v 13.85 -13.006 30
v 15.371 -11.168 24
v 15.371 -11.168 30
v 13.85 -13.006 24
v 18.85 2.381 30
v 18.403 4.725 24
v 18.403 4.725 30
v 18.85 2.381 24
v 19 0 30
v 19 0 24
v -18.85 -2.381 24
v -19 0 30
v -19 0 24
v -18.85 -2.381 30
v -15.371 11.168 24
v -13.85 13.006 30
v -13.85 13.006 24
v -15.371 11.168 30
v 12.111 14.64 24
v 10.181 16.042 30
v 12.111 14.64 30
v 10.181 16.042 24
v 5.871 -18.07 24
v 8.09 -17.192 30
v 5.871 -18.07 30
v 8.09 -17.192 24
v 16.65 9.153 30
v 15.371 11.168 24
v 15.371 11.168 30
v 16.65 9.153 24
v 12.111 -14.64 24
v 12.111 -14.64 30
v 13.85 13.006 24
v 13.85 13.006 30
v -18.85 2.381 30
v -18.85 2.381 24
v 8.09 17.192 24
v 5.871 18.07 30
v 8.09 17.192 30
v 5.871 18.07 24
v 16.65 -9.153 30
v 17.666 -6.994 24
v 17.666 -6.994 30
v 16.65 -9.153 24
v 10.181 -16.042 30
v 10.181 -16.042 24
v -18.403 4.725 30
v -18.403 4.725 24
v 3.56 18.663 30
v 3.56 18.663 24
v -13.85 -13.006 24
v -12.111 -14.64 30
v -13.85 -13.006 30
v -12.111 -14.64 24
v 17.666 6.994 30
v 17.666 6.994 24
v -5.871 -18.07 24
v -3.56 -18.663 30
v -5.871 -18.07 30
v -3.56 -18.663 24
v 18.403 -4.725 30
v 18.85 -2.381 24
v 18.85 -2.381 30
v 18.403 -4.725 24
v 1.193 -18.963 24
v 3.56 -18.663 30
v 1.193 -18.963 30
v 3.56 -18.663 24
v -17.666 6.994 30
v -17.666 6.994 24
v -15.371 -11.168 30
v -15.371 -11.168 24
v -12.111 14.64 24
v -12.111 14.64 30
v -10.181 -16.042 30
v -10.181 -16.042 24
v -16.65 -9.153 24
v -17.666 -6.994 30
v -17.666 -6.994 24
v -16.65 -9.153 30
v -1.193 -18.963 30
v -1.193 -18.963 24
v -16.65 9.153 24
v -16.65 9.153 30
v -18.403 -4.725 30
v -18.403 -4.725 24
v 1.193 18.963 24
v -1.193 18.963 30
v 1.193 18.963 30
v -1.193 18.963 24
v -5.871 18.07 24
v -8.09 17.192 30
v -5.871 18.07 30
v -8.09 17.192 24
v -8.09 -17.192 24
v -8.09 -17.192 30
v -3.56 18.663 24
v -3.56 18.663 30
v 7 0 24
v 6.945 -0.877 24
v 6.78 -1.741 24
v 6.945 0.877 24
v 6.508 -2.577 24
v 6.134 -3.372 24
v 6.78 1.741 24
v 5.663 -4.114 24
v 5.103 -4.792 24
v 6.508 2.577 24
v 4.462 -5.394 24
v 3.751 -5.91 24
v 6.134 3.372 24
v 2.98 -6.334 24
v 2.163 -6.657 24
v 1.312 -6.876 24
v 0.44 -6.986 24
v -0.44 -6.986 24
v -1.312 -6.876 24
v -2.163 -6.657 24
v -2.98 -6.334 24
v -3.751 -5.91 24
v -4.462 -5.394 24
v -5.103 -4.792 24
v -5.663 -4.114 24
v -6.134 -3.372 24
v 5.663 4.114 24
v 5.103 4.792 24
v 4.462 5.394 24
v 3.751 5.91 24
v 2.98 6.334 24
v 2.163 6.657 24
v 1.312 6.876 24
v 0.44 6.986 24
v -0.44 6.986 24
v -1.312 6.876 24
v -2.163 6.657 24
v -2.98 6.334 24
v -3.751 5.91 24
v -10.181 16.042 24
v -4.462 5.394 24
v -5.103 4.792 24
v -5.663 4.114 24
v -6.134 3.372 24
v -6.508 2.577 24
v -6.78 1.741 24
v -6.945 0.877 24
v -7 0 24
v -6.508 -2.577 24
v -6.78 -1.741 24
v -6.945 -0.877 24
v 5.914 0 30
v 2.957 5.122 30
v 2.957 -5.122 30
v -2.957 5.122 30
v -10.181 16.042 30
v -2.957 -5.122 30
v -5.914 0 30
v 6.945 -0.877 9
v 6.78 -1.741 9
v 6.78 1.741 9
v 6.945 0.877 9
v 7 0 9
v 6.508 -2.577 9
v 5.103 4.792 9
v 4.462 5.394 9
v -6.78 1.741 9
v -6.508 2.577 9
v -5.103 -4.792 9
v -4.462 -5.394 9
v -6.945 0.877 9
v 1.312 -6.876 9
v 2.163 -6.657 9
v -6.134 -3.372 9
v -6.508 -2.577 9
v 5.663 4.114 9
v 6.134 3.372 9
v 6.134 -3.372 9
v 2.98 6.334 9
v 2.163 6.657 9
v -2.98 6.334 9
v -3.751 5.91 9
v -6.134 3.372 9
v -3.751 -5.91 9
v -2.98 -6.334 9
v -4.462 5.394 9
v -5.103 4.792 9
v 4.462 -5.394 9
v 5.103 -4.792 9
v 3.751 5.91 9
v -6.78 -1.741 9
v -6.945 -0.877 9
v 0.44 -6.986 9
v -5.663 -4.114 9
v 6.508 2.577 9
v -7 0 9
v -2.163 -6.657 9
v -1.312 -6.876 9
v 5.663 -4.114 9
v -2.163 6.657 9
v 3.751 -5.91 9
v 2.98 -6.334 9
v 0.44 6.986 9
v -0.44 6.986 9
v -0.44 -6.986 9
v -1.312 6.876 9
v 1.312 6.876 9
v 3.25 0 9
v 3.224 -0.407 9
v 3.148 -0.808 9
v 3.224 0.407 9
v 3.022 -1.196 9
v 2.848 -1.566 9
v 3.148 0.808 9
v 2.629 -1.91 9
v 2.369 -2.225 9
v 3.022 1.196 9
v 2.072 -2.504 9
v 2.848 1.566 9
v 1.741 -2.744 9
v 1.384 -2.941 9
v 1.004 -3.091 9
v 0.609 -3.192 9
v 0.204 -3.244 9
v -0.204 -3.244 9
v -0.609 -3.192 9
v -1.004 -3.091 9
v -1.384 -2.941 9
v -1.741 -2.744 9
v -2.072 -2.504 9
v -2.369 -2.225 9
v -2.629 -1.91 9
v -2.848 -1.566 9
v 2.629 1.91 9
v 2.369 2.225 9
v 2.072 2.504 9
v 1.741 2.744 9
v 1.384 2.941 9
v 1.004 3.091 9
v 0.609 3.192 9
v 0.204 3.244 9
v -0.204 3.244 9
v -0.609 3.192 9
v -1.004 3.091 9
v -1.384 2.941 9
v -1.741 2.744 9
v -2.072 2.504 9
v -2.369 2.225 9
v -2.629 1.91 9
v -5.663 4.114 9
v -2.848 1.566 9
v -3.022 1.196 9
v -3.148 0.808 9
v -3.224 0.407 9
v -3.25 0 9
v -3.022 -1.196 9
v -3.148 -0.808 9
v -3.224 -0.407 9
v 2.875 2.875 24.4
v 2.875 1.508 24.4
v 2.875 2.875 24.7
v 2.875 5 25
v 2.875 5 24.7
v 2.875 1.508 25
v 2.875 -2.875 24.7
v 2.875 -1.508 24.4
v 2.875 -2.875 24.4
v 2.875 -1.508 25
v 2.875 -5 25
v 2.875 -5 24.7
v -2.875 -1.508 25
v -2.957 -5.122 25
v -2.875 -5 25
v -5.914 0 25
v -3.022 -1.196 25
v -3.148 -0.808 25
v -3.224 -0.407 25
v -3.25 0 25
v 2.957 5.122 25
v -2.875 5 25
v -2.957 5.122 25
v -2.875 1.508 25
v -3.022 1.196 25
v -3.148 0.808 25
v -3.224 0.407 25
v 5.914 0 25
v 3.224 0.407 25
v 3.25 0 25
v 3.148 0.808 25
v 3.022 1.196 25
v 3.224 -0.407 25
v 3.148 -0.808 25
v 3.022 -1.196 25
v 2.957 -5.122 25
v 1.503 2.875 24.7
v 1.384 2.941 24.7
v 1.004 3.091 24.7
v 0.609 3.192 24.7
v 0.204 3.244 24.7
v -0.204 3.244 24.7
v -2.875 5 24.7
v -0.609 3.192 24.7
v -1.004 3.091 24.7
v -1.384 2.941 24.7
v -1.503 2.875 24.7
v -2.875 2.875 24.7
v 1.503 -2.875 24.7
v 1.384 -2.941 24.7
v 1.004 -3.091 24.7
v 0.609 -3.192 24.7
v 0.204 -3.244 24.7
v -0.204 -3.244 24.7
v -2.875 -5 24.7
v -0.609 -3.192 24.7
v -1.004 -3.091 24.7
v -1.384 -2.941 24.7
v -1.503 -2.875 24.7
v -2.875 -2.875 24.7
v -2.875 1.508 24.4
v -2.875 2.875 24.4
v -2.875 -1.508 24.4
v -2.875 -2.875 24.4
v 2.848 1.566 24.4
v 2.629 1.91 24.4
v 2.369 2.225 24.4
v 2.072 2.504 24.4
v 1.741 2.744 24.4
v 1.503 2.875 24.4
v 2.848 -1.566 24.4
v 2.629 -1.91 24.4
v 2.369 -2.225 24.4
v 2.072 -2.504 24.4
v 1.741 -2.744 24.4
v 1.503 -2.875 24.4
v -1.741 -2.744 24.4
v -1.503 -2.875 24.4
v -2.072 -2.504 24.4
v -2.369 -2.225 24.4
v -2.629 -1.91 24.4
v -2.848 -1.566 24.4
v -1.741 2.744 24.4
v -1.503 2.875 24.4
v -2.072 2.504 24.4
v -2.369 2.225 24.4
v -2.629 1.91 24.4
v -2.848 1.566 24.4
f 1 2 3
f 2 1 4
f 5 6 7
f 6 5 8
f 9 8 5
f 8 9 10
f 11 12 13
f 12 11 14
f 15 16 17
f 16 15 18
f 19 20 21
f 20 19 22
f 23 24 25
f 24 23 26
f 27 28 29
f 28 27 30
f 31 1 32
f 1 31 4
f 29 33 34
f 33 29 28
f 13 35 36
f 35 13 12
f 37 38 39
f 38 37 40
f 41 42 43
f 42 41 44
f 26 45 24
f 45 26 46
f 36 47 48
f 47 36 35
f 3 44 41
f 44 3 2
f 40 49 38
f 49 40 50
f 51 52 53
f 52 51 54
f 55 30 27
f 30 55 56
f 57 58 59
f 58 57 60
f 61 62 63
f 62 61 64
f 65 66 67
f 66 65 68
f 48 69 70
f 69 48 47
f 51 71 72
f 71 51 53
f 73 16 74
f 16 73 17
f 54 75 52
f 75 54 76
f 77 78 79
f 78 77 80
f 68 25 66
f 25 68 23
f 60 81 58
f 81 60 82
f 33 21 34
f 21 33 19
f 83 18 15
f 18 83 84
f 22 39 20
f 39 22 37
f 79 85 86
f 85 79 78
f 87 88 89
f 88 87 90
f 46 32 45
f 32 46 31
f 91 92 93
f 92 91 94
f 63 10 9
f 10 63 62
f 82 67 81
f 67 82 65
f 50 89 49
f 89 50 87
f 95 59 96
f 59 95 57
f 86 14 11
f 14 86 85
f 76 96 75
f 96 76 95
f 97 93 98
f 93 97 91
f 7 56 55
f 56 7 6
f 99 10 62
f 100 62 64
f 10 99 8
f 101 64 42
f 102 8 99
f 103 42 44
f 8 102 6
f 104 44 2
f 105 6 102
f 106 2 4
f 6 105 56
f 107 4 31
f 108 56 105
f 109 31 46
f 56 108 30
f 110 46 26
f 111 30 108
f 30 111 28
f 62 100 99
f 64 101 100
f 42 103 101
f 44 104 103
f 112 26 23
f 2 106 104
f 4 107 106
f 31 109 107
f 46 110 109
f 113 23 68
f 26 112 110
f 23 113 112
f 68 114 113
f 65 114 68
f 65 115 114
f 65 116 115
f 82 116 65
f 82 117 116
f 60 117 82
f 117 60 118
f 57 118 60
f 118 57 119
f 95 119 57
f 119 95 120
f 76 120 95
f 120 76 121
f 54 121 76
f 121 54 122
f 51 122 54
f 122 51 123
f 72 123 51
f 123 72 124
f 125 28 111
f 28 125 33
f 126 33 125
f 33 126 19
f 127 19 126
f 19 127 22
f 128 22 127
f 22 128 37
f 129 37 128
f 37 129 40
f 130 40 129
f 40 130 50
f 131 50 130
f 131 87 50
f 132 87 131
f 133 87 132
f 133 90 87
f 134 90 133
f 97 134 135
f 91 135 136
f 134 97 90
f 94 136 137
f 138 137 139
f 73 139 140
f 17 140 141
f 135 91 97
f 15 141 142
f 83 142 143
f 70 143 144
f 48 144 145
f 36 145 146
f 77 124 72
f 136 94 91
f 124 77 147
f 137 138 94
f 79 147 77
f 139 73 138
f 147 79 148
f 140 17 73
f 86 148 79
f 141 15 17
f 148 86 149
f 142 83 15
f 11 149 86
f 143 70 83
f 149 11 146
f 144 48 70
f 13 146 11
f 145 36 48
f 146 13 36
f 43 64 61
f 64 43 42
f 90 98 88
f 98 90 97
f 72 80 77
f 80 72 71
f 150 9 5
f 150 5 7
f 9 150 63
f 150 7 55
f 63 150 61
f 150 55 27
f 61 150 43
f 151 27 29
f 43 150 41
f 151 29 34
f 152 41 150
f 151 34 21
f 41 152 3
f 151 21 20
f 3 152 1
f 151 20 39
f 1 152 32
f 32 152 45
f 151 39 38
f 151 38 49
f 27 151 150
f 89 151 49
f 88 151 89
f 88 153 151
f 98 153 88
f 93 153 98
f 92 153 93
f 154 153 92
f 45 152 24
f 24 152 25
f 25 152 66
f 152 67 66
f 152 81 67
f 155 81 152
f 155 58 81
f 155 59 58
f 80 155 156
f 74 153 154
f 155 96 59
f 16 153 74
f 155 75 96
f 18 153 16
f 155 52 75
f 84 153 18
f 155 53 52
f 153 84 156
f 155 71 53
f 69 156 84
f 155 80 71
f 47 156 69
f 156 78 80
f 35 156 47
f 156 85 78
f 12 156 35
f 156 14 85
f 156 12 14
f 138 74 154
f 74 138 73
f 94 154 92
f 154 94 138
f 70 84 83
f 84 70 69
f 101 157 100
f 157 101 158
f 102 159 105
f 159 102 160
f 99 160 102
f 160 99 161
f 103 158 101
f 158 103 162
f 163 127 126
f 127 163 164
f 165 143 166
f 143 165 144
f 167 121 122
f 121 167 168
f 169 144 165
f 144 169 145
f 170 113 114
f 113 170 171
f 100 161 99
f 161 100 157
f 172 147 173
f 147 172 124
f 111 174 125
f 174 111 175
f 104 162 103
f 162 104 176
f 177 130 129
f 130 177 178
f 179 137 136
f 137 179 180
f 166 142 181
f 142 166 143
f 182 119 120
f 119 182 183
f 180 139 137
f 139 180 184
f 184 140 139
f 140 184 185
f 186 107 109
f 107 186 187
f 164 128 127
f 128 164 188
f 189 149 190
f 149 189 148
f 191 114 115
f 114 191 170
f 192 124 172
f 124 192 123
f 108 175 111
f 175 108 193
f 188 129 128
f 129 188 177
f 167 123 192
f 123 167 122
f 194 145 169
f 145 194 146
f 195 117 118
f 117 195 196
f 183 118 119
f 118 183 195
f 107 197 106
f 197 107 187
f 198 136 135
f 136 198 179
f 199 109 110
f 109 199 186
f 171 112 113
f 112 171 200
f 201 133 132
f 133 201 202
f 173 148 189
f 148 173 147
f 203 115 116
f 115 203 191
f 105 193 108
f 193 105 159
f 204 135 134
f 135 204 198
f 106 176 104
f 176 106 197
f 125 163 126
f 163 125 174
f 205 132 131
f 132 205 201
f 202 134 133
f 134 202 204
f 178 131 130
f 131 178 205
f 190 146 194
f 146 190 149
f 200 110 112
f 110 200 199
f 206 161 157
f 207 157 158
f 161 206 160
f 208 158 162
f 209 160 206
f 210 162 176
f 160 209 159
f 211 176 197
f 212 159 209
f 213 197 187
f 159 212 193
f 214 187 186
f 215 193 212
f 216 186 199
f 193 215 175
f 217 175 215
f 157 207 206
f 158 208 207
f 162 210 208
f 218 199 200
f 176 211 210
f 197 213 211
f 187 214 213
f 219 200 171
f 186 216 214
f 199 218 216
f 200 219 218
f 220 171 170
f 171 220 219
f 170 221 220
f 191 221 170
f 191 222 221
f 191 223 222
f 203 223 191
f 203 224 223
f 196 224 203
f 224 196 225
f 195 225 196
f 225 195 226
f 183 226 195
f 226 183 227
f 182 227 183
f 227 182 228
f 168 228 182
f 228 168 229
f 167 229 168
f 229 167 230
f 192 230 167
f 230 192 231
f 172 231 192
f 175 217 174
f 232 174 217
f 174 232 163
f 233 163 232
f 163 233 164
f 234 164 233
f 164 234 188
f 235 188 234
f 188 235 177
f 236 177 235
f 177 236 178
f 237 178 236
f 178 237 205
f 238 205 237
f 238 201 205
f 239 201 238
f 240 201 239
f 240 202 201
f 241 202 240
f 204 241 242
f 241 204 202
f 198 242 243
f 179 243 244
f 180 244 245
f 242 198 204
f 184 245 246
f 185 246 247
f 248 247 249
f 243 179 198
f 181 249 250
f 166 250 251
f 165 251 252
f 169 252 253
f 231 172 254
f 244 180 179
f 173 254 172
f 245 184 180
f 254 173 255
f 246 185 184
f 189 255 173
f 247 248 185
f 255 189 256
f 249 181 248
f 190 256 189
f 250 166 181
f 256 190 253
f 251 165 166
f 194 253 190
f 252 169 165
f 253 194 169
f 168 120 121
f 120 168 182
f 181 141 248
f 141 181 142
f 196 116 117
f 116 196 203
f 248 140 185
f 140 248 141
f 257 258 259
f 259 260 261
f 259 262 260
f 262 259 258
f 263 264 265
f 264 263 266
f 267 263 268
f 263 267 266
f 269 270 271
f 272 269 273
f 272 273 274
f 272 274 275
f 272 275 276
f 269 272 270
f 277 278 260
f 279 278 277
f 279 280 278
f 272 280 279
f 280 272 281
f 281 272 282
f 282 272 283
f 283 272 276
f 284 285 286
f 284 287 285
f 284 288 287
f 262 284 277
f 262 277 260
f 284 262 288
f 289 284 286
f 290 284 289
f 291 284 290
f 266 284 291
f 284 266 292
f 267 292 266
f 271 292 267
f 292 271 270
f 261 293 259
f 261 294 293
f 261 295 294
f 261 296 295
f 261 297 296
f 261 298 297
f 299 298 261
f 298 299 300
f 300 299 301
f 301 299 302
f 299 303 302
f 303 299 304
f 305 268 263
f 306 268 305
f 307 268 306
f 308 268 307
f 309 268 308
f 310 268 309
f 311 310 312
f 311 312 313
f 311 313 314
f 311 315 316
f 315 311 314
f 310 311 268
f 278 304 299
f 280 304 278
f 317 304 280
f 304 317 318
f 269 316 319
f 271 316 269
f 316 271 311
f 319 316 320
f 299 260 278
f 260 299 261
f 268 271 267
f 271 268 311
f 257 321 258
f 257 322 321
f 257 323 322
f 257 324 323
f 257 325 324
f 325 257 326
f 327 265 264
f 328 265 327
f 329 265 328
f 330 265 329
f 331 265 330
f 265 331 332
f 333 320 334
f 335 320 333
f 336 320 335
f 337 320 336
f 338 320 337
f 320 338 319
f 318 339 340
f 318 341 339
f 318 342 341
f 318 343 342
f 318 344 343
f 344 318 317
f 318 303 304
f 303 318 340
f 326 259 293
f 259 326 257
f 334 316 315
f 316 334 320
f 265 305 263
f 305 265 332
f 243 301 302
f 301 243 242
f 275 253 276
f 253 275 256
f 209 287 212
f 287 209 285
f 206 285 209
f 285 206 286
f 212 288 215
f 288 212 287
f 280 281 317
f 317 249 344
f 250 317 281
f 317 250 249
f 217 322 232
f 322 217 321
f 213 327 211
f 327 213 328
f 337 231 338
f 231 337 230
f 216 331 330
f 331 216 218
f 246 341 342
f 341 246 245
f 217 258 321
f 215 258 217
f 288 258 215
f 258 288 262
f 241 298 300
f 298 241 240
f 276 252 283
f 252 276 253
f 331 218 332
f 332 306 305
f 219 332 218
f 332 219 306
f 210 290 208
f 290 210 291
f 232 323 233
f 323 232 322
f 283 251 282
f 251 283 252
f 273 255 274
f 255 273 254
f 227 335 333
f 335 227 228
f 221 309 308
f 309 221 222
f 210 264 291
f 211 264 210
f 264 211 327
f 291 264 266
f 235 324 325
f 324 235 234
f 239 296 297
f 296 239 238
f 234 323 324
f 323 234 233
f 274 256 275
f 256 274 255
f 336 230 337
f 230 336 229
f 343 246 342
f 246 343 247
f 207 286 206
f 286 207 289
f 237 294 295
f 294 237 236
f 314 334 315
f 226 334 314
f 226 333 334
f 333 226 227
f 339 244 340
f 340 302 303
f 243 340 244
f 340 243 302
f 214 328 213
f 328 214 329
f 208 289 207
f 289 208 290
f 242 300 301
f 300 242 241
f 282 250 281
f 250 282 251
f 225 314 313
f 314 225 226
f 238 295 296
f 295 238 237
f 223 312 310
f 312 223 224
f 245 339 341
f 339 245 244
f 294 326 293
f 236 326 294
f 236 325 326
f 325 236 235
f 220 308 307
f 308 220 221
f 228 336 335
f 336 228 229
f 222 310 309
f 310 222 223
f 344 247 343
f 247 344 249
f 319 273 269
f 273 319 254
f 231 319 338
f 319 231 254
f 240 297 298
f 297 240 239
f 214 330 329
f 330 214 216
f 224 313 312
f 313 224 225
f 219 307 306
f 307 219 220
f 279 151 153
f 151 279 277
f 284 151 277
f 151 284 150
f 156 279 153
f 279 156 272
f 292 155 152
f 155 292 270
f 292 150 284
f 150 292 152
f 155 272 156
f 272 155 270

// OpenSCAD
$fn = 50;


difference() {
	union() {
		translate(v = [0, 0, 24.0000000000]) {
			cylinder(h = 6, r = 19.0000000000);
		}
		translate(v = [0, 0, 9.0000000000]) {
			cylinder(h = 21, r = 7.0000000000);
		}
	}
	union() {
		translate(v = [0, 0, 30]) {
			rotate(a = [0, 0, 0]) {
				difference() {
					union() {
						#translate(v = [-2.8750000000, -5.0000000000, -5.3000000000]) {
							cube(size = [5.7500000000, 10, 0.3000000000]);
						}
						#translate(v = [-2.8750000000, -2.8750000000, -5.6000000000]) {
							cube(size = [5.7500000000, 5.7500000000, 0.3000000000]);
						}
						#translate(v = [-2.8750000000, -5.0000000000, 0]) {
							cube(size = [5.7500000000, 10, 0.3000000000]);
						}
						#translate(v = [-2.8750000000, -2.8750000000, 0.3000000000]) {
							cube(size = [5.7500000000, 5.7500000000, 0.3000000000]);
						}
						#translate(v = [0, 0, -100.0000000000]) {
							cylinder(h = 200, r = 3.2500000000);
						}
						translate(v = [0, 0, -5]) {
							#linear_extrude(height = 5) {
								polygon(points = [[5.9142500000, 0.0000000000], [2.9571250000, 5.1218907443], [-2.9571250000, 5.1218907443], [-5.9142500000, 0.0000000000], [-2.9571250000, -5.1218907443], [2.9571250000, -5.1218907443]]);
							}
						}
						#translate(v = [-2.8750000000, -5.0000000000, -5.3000000000]) {
							cube(size = [5.7500000000, 10, 0.3000000000]);
						}
						#translate(v = [-2.8750000000, -2.8750000000, -5.6000000000]) {
							cube(size = [5.7500000000, 5.7500000000, 0.3000000000]);
						}
						#translate(v = [-2.8750000000, -5.0000000000, 0]) {
							cube(size = [5.7500000000, 10, 0.3000000000]);
						}
						#translate(v = [-2.8750000000, -2.8750000000, 0.3000000000]) {
							cube(size = [5.7500000000, 5.7500000000, 0.3000000000]);
						}
						#translate(v = [0, 0, -100.0000000000]) {
							cylinder(h = 200, r = 3.2500000000);
						}
						#translate(v = [-2.8750000000, -5.0000000000, -5.3000000000]) {
							cube(size = [5.7500000000, 10, 0.3000000000]);
						}
						#translate(v = [-2.8750000000, -2.8750000000, -5.6000000000]) {
							cube(size = [5.7500000000, 5.7500000000, 0.3000000000]);
						}
						#translate(v = [-2.8750000000, -5.0000000000, 0]) {
							cube(size = [5.7500000000, 10, 0.3000000000]);
						}
						#translate(v = [-2.8750000000, -2.8750000000, 0.3000000000]) {
							cube(size = [5.7500000000, 5.7500000000, 0.3000000000]);
						}
						#translate(v = [0, 0, -100.0000000000]) {
							cylinder(h = 200, r = 3.2500000000);
						}
					}
					union();
				}
			}
		}
		#translate(v = [0, 0, -100.0000000000]) {
			cylinder(h = 200, r = 3.2500000000);
		}
	}
}
